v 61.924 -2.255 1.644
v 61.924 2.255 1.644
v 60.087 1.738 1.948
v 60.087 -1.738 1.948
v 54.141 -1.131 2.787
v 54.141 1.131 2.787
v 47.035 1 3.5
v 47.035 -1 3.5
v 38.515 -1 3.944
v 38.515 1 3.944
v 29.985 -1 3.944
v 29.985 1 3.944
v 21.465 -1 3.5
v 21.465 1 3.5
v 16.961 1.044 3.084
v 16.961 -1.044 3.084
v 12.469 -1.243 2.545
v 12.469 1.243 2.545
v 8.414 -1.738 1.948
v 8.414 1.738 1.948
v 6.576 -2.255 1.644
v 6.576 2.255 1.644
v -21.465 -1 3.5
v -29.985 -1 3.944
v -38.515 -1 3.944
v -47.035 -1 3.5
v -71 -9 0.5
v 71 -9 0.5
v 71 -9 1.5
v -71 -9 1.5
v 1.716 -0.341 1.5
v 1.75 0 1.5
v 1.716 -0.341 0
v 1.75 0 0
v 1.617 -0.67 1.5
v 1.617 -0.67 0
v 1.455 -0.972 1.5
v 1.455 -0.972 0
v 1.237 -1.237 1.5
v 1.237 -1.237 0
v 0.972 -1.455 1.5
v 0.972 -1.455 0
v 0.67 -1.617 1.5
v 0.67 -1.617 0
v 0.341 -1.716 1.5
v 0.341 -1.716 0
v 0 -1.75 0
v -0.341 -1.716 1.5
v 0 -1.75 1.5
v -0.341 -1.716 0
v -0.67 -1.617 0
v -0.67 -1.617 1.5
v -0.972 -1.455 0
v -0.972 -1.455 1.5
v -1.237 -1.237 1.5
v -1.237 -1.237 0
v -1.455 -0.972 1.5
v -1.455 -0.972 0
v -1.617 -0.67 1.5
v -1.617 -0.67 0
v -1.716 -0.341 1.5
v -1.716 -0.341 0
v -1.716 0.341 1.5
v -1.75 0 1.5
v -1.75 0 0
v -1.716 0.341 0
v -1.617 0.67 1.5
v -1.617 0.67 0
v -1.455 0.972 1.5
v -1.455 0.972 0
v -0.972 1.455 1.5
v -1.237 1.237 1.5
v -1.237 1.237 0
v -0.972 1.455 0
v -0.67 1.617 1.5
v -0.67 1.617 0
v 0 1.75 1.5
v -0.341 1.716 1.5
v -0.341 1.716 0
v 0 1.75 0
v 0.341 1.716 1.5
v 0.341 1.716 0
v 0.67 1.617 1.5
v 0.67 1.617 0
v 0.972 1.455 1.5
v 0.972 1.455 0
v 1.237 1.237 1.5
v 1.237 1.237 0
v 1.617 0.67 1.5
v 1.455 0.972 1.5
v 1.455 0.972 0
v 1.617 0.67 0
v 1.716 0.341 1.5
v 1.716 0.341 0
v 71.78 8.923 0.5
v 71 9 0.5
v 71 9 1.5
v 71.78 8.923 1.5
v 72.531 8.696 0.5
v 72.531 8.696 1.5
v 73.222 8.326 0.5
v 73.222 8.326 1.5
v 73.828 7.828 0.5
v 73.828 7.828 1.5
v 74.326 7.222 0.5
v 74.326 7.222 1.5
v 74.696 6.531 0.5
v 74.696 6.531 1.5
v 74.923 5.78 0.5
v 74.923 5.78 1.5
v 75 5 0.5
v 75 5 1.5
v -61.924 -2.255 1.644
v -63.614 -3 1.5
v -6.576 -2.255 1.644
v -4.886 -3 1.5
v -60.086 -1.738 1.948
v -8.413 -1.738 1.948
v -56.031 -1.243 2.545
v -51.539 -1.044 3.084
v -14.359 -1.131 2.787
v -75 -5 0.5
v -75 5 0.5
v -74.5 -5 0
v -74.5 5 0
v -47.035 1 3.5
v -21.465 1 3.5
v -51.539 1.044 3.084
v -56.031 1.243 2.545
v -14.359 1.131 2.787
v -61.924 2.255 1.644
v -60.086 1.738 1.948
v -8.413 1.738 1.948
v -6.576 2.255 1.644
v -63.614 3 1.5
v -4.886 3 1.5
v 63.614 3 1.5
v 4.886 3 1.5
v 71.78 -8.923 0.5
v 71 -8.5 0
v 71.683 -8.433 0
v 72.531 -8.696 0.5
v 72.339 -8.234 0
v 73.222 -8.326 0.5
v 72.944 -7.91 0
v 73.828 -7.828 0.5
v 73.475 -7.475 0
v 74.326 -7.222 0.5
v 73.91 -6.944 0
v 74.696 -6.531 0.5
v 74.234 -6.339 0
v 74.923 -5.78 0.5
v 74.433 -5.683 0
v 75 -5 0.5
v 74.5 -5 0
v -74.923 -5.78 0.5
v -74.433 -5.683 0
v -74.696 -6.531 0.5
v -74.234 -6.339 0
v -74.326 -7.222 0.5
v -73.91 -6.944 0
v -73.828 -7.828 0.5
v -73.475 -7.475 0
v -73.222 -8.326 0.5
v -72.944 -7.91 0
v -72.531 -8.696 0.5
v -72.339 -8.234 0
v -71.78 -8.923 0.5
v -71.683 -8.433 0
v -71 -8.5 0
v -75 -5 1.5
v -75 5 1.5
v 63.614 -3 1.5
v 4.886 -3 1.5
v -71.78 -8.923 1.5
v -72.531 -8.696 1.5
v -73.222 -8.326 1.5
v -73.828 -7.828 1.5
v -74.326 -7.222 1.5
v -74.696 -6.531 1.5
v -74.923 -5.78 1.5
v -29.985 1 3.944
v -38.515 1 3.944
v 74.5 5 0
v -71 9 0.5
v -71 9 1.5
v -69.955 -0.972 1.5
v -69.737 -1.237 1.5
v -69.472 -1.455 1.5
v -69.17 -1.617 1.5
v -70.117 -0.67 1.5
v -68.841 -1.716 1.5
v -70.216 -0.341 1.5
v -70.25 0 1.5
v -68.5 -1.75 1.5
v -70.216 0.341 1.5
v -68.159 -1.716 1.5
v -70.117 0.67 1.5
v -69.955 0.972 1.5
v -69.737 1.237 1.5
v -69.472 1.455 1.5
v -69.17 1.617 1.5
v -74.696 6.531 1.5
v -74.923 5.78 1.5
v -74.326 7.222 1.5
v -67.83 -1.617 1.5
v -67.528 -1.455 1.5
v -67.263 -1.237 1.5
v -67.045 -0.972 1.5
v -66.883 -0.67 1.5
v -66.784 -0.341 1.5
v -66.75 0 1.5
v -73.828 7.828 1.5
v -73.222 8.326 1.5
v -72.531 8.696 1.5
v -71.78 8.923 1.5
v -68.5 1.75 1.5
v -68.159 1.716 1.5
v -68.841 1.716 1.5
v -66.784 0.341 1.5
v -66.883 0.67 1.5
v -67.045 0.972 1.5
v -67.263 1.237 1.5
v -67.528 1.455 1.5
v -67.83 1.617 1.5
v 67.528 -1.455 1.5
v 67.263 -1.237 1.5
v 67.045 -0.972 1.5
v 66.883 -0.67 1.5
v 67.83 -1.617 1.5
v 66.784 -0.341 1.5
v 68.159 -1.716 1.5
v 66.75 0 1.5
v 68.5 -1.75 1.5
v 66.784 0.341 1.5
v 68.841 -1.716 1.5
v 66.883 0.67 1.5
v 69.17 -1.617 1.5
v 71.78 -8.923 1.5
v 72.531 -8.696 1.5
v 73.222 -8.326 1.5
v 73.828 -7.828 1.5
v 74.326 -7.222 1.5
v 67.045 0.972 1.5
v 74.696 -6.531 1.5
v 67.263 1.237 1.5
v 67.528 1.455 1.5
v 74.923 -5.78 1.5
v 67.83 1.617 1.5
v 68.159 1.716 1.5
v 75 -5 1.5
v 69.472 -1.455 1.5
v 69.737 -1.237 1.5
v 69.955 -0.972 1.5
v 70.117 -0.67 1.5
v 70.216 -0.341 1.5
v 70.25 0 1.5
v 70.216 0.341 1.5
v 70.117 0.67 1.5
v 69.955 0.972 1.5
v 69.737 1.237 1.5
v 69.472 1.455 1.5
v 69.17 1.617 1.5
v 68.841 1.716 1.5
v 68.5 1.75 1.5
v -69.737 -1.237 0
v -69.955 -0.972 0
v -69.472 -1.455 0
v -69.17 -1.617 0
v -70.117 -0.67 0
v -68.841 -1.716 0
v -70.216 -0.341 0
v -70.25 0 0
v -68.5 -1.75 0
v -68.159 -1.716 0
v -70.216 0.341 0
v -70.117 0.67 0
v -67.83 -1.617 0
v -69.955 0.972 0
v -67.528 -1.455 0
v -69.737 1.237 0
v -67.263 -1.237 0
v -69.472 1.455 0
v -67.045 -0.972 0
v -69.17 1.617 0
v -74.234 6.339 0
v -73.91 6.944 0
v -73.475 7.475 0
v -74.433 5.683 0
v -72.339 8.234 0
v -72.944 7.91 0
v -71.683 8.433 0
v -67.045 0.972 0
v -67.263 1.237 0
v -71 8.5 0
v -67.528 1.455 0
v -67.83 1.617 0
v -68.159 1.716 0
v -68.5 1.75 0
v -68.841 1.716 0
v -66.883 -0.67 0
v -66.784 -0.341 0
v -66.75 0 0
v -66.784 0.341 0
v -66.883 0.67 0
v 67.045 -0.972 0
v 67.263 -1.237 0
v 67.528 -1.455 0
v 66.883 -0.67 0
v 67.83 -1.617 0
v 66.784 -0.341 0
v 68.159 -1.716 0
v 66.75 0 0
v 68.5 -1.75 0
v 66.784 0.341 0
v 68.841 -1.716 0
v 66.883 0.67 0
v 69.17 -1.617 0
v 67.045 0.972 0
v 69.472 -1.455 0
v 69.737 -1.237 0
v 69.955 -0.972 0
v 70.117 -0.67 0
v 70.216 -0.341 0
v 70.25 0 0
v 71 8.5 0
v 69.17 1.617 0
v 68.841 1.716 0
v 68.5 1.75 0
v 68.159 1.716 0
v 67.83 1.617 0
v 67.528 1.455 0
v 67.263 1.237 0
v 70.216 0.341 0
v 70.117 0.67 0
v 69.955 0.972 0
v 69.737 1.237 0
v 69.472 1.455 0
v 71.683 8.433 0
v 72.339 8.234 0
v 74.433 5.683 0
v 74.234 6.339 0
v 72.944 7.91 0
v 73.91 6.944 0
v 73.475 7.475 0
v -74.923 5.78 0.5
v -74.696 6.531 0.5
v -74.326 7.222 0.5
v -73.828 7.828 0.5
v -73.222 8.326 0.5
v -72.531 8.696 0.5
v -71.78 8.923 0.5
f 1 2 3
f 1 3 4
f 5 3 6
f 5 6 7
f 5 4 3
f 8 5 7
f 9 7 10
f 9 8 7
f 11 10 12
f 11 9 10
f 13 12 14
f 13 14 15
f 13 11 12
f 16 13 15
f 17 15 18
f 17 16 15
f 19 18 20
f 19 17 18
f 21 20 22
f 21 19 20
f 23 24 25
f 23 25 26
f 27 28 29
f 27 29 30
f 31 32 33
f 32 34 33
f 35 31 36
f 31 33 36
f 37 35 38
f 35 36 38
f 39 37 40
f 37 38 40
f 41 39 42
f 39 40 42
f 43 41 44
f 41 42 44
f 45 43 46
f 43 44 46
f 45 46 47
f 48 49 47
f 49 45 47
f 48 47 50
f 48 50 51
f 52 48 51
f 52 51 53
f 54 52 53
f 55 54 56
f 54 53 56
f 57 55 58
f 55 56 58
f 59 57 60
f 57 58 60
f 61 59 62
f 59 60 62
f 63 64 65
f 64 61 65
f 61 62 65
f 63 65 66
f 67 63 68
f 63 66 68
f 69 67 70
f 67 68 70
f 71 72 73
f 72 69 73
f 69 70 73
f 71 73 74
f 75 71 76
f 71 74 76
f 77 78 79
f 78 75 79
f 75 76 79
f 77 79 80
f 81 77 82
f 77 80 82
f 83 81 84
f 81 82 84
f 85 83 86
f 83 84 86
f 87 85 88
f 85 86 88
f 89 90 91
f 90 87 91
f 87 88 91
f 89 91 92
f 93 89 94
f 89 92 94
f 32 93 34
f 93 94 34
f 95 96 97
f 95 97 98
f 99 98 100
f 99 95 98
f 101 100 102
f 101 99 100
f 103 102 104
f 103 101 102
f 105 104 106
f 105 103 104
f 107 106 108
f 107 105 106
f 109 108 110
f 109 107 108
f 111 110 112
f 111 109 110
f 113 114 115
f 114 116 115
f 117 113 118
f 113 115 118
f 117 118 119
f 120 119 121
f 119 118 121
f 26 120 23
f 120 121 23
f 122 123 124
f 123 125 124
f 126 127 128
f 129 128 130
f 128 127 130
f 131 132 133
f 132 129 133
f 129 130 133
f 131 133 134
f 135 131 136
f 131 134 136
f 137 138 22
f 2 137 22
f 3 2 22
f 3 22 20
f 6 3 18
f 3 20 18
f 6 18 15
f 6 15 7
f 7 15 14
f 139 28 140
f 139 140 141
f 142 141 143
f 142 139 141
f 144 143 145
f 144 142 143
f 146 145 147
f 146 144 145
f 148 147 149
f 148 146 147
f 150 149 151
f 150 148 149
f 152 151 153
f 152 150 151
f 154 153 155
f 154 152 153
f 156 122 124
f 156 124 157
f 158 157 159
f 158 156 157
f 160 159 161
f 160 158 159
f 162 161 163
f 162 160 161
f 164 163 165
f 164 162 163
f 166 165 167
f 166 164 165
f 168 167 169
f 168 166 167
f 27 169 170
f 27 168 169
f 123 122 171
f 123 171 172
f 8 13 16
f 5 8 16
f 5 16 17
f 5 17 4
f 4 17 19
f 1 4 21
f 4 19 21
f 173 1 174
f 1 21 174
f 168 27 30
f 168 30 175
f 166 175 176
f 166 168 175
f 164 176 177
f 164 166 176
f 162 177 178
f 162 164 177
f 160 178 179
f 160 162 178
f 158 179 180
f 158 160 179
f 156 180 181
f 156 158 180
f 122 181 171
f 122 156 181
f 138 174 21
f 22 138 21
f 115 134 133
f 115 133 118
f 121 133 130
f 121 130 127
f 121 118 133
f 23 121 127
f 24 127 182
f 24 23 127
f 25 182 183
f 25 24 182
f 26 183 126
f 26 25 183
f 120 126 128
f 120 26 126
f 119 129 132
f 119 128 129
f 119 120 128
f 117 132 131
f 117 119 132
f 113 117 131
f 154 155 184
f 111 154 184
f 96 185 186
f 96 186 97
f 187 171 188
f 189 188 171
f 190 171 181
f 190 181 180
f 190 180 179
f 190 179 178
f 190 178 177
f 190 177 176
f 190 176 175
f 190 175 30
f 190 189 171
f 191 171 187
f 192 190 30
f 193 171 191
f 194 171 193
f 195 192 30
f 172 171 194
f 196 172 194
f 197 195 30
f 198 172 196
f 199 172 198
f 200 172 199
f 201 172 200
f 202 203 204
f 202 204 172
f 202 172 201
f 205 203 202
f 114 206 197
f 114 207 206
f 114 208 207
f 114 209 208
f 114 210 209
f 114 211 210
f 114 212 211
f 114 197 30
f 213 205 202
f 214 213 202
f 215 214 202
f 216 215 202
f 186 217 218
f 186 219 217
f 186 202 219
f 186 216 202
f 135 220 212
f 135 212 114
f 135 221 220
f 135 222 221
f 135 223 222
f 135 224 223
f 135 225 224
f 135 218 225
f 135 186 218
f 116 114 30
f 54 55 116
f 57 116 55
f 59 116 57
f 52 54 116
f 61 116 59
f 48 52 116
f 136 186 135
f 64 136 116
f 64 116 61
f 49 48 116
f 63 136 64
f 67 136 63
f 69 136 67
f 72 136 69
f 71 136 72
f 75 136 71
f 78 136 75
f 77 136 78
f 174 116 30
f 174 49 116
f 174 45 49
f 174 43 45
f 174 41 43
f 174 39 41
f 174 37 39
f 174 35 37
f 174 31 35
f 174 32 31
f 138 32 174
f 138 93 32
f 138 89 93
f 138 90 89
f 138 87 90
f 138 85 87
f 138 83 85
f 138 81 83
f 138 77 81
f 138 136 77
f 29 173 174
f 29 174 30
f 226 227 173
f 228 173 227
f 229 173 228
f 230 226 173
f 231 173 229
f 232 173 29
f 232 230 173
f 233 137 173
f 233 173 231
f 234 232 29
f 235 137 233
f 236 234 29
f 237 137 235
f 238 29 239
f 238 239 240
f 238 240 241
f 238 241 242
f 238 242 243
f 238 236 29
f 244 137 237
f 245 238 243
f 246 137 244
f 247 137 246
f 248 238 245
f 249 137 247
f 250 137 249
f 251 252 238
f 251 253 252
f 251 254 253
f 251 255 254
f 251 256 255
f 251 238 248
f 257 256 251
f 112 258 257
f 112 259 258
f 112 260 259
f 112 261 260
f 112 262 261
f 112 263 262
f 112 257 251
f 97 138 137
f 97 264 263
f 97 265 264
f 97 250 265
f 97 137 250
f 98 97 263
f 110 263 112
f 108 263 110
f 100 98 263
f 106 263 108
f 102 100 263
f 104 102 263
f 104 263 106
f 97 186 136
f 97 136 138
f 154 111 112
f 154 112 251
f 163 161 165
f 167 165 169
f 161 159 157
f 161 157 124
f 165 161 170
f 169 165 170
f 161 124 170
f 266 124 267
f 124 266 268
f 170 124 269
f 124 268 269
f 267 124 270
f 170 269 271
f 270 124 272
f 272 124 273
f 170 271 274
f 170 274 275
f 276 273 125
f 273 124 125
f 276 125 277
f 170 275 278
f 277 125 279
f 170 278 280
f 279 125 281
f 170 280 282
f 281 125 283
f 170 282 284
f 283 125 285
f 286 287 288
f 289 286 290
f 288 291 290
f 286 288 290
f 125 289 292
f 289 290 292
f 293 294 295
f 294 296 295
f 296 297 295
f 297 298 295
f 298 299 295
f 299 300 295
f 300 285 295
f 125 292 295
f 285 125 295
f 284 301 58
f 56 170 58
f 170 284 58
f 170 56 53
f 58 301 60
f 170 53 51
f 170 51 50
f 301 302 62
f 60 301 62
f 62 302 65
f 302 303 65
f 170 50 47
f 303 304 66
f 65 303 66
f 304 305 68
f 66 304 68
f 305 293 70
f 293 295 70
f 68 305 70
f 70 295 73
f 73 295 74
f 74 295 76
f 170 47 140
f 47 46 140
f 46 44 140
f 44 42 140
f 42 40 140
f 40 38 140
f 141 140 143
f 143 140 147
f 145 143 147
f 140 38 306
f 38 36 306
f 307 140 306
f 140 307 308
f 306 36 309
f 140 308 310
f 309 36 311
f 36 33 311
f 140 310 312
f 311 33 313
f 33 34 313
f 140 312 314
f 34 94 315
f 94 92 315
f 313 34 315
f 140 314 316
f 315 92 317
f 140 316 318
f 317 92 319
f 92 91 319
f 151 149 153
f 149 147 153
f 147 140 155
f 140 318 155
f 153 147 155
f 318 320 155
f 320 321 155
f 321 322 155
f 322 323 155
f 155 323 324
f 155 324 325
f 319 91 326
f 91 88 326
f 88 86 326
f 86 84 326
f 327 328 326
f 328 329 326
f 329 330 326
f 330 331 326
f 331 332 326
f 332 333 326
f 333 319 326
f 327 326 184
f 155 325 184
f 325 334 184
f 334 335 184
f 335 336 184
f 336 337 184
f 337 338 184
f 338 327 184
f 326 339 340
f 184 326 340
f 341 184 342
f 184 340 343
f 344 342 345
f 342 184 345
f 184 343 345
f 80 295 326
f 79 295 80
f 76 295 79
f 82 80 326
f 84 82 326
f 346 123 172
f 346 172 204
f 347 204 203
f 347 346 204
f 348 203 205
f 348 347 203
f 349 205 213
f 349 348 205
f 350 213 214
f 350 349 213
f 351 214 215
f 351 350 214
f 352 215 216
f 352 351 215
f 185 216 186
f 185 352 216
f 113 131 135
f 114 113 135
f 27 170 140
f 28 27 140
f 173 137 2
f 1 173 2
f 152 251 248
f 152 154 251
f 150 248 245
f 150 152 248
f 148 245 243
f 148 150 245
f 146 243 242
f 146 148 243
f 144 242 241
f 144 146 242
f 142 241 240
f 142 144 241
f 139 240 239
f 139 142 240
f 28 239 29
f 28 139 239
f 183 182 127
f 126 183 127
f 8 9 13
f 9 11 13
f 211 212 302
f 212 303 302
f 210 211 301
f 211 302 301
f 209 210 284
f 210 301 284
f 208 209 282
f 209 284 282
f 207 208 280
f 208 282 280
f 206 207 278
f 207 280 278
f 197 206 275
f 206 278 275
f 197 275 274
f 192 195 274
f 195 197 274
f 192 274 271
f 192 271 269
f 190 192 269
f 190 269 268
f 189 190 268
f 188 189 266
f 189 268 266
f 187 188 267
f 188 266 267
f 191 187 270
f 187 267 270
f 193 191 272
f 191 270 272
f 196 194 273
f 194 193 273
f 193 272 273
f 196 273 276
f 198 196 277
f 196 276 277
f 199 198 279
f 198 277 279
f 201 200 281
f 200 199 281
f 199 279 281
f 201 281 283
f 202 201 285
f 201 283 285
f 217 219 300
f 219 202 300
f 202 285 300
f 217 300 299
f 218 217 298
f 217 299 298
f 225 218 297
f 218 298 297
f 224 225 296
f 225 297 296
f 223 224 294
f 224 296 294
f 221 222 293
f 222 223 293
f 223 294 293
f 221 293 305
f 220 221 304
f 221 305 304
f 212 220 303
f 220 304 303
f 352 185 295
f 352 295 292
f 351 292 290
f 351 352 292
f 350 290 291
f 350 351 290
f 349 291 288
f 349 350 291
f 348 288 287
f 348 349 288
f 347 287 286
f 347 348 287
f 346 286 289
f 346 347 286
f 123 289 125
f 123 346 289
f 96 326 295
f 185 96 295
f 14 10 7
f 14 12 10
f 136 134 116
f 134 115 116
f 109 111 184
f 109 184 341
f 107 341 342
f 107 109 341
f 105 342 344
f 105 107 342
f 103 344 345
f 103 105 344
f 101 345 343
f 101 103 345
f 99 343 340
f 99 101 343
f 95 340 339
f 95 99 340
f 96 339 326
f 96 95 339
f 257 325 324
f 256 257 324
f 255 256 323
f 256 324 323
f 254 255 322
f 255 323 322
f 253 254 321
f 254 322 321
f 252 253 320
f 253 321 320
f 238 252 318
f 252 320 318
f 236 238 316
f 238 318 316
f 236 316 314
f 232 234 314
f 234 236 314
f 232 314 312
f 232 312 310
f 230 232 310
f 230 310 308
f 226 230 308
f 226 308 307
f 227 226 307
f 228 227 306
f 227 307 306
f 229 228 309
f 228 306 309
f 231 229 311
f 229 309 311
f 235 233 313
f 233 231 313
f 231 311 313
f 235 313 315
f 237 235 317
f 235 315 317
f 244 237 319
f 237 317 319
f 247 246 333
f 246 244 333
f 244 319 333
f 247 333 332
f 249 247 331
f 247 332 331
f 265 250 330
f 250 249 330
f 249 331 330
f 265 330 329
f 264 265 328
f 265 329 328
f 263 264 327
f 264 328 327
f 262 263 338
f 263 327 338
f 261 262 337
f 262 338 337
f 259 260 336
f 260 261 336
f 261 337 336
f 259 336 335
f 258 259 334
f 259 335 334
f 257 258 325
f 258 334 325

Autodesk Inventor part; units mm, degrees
ref_plane "YZ Plane" through (0, 0, 0) normal (1, 0, 0) x (0, 1, 0)
ref_plane "XZ Plane" through (0, 0, 0) normal (0, 1, 0) x (-1, 0, 0)
ref_plane "XY Plane" through (0, 0, 0) normal (0, 0, 1) x (1, 0, 0)
sketch "Sketch1" plane through (0, 0, 0) normal (0, 0, 1) x (1, 0, 0)
  line L0 (71, -9) -> (-71, -9)
  line L1 (-75, -5) -> (-75, 5)
  line L2 (-71, 9) -> (71, 9)
  line L3 (75, 5) -> (75, -5)
  line L4 (75, -9) -> (-75, 9) construction
  line L5 (-75, -9) -> (75, 9) construction
  arc A0 (-71, 9) -> (-75, 5) centre (-71, 5) ccw
  arc A1 (-75, -5) -> (-71, -9) centre (-71, -5) ccw
  arc A2 (75, 5) -> (71, 9) centre (71, 5) ccw
  arc A3 (71, -9) -> (75, -5) centre (71, -5) ccw
  circle A4 centre (0, 0) radius 1.75
  line L6 (-75, 0) -> (-68.5, 0) construction
  line L7 (75, 0) -> (68.5, 0) construction
  circle A5 centre (-68.5, 0) radius 1.75
  circle A6 centre (68.5, 0) radius 1.75
  dimension "d0" = 4
  dimension "d2" = 150
  dimension "d3" = 18
  dimension "d4" = 3.5
  dimension "d5" = 6.5
  dimension "d6" = 6.5
extrude "Extrusion1" add sketch "Sketch1" along normal blind 1.5
sketch "Sketch2" plane through (0, 0, 0) normal (0, 1, 0) x (-1, 0, 0)
  line L0 (71, 1.5) -> (-71, 1.5) projected
  arc A0 (62.75, 1.5) -> (5.75, 1.5) centre (34.25, -159.7) ccw
  line L1 (-1.75, 1.5) -> (1.75, 1.5) projected
  line L2 (0, 1.5) -> (0, 8.4786) construction
  line L3 (66.75, 1.5) -> (70.25, 1.5) projected
  line L4 (66.75, 1.5) -> (62.75, 1.5) construction
  line L5 (5.75, 1.5) -> (1.75, 1.5) construction
  line L6 (1.75, 1.5) -> (1.75, 0) projected
  line L7 (46.1417, 4) -> (24.4242, 4) construction
  point P0 (0, 0)
  dimension "d9" = 4
  dimension "d10" = 2.5
extrude "Extrusion2" add sketch "Sketch2" along normal mid plane 2
fillet "Fillet1" radius 2 2 edges at (-34.25, -1, 1.5) (-34.25, 1, 1.5)
fillet "Fillet1" radius 10 2 edges at (-62.75, 0, 1.5) (-5.75, 0, 1.5)
mirror "Mirror1" about plane through (0, 0, 0) normal (1, 0, 0) of "Extrusion2", "Fillet1"
chamfer "Chamfer1" distance 0.5 angle 45 8 edges at (0, -9, 0) (73.8284, -7.8284, 0) (75, 0, 0) (73.8284, 7.8284, 0) (0, 9, 0) (-73.8284, 7.8284, 0) (-75, 0, 0) (-73.8284, -7.8284, 0)
properties part number "LEDLid"
